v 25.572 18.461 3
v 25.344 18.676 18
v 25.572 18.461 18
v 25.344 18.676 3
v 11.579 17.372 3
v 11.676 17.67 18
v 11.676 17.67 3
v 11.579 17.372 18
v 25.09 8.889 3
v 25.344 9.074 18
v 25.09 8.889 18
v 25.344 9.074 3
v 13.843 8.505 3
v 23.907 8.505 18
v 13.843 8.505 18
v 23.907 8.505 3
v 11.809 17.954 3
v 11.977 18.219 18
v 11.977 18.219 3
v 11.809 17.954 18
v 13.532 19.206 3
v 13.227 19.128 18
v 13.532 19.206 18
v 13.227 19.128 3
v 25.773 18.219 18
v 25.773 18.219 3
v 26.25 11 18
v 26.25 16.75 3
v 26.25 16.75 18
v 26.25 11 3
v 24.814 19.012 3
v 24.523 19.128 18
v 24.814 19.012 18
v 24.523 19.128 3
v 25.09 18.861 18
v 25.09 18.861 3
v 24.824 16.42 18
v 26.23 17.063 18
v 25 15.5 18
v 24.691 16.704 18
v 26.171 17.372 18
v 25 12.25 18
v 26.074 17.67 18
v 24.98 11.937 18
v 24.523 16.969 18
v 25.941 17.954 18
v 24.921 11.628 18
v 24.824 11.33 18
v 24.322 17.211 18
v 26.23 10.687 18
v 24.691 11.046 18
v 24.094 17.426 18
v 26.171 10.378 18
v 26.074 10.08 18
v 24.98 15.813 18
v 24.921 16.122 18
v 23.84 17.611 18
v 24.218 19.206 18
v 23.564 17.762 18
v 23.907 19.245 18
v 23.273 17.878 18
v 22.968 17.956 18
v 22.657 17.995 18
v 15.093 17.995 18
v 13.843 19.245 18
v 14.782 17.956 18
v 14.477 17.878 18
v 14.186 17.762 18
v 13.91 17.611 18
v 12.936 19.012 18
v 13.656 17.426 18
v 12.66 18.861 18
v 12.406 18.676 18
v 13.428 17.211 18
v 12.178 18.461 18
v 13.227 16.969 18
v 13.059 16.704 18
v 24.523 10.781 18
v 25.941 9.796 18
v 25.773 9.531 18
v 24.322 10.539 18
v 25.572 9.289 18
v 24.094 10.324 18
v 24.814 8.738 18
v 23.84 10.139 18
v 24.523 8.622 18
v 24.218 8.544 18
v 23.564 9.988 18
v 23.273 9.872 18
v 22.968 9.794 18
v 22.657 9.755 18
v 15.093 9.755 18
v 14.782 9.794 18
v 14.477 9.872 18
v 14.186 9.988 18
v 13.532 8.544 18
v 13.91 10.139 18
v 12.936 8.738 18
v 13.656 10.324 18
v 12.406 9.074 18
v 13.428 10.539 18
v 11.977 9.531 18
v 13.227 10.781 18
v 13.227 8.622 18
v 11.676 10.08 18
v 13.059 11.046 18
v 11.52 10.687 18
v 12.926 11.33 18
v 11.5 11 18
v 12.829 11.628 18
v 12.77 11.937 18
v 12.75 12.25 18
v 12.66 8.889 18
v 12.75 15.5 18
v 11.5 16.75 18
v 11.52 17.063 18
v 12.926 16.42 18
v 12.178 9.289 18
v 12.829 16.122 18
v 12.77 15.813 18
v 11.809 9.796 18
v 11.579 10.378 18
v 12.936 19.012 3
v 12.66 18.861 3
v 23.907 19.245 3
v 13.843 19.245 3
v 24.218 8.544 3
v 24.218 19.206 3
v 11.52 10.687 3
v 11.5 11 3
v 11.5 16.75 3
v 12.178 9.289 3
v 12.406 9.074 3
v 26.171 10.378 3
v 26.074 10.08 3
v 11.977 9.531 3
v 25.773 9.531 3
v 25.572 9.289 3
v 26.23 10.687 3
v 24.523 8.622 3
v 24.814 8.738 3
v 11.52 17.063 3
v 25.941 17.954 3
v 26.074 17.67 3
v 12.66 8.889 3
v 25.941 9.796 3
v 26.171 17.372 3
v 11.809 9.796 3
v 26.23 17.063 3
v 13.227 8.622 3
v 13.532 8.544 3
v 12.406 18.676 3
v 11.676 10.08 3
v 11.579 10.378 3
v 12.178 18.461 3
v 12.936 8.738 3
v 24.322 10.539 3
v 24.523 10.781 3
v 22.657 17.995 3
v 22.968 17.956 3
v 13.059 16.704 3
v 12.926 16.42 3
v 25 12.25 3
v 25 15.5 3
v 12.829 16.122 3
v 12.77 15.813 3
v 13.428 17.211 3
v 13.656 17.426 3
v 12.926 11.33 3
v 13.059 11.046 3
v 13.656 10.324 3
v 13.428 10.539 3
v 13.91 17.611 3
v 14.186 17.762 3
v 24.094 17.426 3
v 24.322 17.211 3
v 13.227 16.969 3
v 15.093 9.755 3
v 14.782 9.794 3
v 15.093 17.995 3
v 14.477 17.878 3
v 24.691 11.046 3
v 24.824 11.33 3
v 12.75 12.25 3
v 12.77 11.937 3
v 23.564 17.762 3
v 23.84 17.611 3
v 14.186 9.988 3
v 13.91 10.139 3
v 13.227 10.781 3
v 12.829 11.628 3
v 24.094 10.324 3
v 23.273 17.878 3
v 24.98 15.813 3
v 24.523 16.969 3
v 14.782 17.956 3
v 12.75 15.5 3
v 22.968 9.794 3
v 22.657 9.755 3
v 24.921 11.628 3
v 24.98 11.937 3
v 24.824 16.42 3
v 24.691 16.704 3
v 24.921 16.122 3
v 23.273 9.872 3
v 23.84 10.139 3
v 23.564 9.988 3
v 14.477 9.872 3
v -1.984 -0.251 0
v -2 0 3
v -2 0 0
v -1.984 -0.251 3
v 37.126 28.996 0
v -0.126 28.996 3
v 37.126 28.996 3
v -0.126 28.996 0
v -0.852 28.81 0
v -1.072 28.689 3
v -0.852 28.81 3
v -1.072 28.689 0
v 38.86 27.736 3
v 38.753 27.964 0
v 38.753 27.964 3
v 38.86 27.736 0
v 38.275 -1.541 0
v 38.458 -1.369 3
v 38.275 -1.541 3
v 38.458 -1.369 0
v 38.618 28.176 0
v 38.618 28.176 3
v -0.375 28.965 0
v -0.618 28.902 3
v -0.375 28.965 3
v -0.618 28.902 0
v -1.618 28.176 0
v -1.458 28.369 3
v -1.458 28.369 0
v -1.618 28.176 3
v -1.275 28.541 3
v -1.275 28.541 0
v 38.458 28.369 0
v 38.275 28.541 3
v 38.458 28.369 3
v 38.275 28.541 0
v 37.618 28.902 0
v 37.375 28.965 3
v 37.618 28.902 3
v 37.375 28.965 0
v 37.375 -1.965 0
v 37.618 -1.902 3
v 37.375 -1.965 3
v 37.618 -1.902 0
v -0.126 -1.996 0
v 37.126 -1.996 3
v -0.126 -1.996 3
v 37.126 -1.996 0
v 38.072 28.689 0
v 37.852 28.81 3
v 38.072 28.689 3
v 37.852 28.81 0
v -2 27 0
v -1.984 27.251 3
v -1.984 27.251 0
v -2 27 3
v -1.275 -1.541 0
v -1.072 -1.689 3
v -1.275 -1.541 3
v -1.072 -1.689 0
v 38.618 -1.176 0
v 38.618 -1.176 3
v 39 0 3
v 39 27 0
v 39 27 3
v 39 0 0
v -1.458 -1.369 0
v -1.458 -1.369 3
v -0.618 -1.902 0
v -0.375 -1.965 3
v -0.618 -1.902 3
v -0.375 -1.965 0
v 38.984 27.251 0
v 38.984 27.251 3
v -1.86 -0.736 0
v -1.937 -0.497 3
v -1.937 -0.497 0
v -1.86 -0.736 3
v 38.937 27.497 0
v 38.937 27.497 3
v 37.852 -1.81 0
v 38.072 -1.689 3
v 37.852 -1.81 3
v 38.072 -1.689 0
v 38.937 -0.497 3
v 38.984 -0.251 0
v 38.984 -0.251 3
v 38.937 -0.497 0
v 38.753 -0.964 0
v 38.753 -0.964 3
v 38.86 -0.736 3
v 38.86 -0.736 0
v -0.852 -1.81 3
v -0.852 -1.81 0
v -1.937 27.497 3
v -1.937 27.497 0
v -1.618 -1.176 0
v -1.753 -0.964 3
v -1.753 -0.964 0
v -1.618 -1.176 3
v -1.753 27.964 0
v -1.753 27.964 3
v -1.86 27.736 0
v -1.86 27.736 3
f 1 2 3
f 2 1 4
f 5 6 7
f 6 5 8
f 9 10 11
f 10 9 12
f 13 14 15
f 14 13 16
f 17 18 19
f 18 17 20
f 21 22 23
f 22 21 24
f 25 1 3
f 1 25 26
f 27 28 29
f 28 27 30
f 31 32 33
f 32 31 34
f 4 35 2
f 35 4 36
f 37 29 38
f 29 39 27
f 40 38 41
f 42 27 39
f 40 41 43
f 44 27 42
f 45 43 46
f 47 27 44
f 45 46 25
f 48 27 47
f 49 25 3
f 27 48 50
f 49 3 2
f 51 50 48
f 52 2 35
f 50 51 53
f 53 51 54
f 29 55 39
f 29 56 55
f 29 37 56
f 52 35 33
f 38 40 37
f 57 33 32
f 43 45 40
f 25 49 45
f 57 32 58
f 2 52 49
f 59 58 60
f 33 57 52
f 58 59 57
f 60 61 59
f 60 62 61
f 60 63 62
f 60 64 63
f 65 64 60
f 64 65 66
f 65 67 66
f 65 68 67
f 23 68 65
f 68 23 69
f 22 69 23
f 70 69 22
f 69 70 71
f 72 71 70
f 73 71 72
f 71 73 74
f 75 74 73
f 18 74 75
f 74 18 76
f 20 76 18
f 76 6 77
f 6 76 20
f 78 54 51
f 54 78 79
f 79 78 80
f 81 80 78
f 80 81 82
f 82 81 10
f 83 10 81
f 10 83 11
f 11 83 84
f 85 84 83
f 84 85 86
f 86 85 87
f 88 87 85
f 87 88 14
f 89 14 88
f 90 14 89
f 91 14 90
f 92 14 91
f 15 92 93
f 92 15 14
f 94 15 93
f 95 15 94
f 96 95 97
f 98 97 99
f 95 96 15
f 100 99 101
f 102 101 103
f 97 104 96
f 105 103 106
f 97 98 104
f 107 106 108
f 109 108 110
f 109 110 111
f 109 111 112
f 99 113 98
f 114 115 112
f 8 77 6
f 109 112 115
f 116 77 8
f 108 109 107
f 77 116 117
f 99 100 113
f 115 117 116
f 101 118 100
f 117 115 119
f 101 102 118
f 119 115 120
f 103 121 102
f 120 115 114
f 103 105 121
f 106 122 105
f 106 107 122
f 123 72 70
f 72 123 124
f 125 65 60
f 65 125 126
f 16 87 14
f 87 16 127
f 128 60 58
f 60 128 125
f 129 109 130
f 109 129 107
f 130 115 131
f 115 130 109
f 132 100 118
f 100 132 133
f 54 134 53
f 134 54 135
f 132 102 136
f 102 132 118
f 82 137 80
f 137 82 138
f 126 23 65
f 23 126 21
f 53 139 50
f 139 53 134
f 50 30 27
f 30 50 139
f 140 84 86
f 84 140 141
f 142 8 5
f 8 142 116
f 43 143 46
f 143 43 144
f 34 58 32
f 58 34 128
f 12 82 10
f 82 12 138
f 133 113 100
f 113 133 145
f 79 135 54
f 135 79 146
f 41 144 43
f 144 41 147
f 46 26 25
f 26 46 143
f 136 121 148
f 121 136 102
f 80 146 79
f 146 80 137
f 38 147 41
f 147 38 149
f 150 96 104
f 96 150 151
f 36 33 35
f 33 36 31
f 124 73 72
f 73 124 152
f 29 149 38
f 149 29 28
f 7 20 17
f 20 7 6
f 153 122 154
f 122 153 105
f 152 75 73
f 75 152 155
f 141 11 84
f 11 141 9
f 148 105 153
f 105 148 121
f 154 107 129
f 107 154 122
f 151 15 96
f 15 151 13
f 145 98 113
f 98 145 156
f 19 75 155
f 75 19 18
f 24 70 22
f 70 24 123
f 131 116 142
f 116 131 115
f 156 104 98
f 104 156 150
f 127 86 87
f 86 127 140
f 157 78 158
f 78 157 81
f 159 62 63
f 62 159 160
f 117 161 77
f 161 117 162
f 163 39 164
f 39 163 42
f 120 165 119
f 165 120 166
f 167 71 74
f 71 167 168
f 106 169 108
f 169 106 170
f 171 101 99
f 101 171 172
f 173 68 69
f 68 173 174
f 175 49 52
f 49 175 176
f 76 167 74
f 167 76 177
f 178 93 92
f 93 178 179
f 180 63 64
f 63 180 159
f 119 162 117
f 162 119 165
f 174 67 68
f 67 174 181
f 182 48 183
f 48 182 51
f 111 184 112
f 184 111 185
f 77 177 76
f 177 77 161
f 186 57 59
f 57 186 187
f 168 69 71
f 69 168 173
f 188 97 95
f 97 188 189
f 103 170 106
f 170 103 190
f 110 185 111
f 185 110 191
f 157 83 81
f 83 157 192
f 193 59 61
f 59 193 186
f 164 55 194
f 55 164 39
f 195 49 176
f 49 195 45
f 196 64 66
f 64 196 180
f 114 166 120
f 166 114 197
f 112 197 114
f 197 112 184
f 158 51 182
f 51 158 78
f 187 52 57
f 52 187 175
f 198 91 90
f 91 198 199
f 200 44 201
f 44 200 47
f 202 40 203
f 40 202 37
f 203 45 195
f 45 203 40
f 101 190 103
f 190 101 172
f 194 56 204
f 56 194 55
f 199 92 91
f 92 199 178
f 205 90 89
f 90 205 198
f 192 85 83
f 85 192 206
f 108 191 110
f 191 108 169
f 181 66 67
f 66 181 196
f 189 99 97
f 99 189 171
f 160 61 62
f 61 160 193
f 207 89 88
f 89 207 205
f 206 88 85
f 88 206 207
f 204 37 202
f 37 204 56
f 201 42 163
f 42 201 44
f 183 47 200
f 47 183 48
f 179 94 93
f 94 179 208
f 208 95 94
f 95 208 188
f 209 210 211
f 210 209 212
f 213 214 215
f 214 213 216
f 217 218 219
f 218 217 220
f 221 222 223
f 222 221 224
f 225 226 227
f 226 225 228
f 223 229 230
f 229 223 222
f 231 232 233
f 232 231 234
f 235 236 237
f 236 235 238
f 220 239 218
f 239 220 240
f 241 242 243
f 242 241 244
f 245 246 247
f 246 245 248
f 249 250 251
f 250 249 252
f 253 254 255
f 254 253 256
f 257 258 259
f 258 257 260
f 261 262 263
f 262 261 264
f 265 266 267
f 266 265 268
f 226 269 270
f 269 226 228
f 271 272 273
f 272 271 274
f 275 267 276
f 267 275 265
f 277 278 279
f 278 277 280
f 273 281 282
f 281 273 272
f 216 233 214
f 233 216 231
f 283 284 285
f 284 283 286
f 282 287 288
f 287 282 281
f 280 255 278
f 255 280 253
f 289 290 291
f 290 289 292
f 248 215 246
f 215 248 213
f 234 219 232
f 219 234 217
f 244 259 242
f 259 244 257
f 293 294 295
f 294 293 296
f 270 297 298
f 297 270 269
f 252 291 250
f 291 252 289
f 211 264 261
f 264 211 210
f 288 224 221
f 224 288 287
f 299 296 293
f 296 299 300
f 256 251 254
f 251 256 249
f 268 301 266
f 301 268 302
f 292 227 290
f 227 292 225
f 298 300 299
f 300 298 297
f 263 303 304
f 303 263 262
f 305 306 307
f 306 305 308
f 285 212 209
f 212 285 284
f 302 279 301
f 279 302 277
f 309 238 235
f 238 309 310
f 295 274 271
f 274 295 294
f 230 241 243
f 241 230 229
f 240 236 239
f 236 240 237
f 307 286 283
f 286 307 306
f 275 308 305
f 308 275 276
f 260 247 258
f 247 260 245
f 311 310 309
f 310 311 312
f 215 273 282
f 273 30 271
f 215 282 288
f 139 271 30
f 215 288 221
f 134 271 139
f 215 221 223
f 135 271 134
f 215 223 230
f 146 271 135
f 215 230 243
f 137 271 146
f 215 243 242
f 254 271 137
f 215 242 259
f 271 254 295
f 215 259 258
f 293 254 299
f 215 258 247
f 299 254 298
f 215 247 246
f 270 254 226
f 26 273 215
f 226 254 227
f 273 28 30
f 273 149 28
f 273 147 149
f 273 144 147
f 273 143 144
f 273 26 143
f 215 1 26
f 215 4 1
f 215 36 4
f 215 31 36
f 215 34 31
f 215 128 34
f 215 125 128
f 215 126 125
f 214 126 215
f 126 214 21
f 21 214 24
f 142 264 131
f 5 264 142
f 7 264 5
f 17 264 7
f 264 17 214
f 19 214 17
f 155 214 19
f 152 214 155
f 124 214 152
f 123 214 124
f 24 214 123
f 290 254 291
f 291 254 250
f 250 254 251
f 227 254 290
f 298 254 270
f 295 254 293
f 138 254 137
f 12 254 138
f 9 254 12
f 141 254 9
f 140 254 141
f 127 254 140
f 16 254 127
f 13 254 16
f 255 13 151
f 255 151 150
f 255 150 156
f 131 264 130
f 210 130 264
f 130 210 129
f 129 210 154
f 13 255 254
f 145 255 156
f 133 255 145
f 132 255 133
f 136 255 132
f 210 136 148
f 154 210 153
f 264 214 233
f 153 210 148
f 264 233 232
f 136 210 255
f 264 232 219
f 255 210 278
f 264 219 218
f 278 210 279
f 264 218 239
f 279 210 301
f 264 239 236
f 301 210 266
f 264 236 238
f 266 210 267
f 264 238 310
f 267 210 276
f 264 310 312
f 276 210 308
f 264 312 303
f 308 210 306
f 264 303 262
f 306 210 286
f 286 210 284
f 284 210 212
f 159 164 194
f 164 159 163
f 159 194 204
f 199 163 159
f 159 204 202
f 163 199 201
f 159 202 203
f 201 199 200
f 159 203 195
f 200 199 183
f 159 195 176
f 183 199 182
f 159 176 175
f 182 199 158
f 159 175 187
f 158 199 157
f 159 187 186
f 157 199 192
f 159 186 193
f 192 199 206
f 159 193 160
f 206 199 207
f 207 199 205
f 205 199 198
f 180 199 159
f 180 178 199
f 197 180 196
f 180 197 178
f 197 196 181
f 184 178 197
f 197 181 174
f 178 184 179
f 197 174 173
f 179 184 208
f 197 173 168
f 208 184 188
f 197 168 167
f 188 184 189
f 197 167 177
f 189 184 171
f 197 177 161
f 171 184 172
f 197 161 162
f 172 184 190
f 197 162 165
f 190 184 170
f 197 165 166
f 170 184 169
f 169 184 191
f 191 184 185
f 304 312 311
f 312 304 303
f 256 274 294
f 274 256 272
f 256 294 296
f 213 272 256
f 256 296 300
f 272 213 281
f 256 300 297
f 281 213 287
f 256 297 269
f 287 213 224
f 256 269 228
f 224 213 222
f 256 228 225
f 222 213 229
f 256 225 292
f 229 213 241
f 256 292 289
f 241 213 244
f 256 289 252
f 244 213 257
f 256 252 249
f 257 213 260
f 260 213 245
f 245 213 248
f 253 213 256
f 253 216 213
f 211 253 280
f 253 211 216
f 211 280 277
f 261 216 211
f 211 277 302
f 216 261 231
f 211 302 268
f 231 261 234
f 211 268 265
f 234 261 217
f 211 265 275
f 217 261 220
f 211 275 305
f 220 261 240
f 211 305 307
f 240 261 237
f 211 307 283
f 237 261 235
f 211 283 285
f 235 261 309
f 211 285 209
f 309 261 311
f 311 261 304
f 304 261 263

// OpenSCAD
$fn = 256;

module miniround(size, radius) {
    $fn=50;
    x = size[0]-radius/2;
    y = size[1]-radius/2;

    minkowski() {
        cube(size=[x,y,size[2]]);
        cylinder(r=radius);
        // Using a sphere is possible, but will kill performance
        //sphere(r=radius);
    }

}

// FIXME

/* Her bør det brukes hull() for å kombinere to sylindre i stedet for de
 * jallagreiene her. Jeg veit ikke om hull() fantes da jeg først skreiv dette,
 * men om det gjorde det, så kjente jeg i hvert fall ikke til det.
 */

// oval greie 13x17mm ytre dim, tykkelse på veggene 2,5mm, så indre dim 8x12mm
/*
miniround([40,30,2], 2);
translate([18,15,2]) {
    scale([1.3,1.0,1.0]) {
        difference() {
            cylinder(d=13,h=15);
            cylinder(d=9,h=15);
        }
    }
}
*/

//translate([50,0,0]) 
{
miniround([38,28,2], 2);
    translate([14,11,2]) {
        difference() {
            miniround([14.5-3.5,10.5-3.5,15], 2.5);
            translate([1.25,1.25,0]) {
                miniround([12-3.5,8-3.5,15], 2.5);
            }
        }
    }
}

/*
module rarellipse(x,y) {
    translate([x,15,2]) {
        cylinder(d=13,h=15);
    }
    translate([y,15,2]) {
        cylinder(d=13,h=15);
    }

    translate([(x+y)/2-x/4.3,x/2.1,2]) {
//        cube([6,13,15]);
        cube([x/3,13,15]);
    }
}
*/
/*
translate([50,0,0]) {
    miniround([40,30,2], 2);
    difference() {
        rarellipse(18,22);
        rarellipse(15.5,19.5);
    }
*/
    /*
    difference() {
        {
            translate([18,15,2]) {
                cylinder(d=13,h=15);
            }
            translate([22,15,2]) {
                cylinder(d=13,h=15);
            }

            translate([17,8.54,2]) {
                cube([6,13,15]);
            }
        }
        {
            translate([18,15,2]) {
                cylinder(d=9,h=15);
            }
            translate([22,15,2]) {
                cylinder(d=9,h=15);
            }
            translate([17,8.54,2]) {
                cube([6,13,15]);
            }
        }
    }
*/
//}
